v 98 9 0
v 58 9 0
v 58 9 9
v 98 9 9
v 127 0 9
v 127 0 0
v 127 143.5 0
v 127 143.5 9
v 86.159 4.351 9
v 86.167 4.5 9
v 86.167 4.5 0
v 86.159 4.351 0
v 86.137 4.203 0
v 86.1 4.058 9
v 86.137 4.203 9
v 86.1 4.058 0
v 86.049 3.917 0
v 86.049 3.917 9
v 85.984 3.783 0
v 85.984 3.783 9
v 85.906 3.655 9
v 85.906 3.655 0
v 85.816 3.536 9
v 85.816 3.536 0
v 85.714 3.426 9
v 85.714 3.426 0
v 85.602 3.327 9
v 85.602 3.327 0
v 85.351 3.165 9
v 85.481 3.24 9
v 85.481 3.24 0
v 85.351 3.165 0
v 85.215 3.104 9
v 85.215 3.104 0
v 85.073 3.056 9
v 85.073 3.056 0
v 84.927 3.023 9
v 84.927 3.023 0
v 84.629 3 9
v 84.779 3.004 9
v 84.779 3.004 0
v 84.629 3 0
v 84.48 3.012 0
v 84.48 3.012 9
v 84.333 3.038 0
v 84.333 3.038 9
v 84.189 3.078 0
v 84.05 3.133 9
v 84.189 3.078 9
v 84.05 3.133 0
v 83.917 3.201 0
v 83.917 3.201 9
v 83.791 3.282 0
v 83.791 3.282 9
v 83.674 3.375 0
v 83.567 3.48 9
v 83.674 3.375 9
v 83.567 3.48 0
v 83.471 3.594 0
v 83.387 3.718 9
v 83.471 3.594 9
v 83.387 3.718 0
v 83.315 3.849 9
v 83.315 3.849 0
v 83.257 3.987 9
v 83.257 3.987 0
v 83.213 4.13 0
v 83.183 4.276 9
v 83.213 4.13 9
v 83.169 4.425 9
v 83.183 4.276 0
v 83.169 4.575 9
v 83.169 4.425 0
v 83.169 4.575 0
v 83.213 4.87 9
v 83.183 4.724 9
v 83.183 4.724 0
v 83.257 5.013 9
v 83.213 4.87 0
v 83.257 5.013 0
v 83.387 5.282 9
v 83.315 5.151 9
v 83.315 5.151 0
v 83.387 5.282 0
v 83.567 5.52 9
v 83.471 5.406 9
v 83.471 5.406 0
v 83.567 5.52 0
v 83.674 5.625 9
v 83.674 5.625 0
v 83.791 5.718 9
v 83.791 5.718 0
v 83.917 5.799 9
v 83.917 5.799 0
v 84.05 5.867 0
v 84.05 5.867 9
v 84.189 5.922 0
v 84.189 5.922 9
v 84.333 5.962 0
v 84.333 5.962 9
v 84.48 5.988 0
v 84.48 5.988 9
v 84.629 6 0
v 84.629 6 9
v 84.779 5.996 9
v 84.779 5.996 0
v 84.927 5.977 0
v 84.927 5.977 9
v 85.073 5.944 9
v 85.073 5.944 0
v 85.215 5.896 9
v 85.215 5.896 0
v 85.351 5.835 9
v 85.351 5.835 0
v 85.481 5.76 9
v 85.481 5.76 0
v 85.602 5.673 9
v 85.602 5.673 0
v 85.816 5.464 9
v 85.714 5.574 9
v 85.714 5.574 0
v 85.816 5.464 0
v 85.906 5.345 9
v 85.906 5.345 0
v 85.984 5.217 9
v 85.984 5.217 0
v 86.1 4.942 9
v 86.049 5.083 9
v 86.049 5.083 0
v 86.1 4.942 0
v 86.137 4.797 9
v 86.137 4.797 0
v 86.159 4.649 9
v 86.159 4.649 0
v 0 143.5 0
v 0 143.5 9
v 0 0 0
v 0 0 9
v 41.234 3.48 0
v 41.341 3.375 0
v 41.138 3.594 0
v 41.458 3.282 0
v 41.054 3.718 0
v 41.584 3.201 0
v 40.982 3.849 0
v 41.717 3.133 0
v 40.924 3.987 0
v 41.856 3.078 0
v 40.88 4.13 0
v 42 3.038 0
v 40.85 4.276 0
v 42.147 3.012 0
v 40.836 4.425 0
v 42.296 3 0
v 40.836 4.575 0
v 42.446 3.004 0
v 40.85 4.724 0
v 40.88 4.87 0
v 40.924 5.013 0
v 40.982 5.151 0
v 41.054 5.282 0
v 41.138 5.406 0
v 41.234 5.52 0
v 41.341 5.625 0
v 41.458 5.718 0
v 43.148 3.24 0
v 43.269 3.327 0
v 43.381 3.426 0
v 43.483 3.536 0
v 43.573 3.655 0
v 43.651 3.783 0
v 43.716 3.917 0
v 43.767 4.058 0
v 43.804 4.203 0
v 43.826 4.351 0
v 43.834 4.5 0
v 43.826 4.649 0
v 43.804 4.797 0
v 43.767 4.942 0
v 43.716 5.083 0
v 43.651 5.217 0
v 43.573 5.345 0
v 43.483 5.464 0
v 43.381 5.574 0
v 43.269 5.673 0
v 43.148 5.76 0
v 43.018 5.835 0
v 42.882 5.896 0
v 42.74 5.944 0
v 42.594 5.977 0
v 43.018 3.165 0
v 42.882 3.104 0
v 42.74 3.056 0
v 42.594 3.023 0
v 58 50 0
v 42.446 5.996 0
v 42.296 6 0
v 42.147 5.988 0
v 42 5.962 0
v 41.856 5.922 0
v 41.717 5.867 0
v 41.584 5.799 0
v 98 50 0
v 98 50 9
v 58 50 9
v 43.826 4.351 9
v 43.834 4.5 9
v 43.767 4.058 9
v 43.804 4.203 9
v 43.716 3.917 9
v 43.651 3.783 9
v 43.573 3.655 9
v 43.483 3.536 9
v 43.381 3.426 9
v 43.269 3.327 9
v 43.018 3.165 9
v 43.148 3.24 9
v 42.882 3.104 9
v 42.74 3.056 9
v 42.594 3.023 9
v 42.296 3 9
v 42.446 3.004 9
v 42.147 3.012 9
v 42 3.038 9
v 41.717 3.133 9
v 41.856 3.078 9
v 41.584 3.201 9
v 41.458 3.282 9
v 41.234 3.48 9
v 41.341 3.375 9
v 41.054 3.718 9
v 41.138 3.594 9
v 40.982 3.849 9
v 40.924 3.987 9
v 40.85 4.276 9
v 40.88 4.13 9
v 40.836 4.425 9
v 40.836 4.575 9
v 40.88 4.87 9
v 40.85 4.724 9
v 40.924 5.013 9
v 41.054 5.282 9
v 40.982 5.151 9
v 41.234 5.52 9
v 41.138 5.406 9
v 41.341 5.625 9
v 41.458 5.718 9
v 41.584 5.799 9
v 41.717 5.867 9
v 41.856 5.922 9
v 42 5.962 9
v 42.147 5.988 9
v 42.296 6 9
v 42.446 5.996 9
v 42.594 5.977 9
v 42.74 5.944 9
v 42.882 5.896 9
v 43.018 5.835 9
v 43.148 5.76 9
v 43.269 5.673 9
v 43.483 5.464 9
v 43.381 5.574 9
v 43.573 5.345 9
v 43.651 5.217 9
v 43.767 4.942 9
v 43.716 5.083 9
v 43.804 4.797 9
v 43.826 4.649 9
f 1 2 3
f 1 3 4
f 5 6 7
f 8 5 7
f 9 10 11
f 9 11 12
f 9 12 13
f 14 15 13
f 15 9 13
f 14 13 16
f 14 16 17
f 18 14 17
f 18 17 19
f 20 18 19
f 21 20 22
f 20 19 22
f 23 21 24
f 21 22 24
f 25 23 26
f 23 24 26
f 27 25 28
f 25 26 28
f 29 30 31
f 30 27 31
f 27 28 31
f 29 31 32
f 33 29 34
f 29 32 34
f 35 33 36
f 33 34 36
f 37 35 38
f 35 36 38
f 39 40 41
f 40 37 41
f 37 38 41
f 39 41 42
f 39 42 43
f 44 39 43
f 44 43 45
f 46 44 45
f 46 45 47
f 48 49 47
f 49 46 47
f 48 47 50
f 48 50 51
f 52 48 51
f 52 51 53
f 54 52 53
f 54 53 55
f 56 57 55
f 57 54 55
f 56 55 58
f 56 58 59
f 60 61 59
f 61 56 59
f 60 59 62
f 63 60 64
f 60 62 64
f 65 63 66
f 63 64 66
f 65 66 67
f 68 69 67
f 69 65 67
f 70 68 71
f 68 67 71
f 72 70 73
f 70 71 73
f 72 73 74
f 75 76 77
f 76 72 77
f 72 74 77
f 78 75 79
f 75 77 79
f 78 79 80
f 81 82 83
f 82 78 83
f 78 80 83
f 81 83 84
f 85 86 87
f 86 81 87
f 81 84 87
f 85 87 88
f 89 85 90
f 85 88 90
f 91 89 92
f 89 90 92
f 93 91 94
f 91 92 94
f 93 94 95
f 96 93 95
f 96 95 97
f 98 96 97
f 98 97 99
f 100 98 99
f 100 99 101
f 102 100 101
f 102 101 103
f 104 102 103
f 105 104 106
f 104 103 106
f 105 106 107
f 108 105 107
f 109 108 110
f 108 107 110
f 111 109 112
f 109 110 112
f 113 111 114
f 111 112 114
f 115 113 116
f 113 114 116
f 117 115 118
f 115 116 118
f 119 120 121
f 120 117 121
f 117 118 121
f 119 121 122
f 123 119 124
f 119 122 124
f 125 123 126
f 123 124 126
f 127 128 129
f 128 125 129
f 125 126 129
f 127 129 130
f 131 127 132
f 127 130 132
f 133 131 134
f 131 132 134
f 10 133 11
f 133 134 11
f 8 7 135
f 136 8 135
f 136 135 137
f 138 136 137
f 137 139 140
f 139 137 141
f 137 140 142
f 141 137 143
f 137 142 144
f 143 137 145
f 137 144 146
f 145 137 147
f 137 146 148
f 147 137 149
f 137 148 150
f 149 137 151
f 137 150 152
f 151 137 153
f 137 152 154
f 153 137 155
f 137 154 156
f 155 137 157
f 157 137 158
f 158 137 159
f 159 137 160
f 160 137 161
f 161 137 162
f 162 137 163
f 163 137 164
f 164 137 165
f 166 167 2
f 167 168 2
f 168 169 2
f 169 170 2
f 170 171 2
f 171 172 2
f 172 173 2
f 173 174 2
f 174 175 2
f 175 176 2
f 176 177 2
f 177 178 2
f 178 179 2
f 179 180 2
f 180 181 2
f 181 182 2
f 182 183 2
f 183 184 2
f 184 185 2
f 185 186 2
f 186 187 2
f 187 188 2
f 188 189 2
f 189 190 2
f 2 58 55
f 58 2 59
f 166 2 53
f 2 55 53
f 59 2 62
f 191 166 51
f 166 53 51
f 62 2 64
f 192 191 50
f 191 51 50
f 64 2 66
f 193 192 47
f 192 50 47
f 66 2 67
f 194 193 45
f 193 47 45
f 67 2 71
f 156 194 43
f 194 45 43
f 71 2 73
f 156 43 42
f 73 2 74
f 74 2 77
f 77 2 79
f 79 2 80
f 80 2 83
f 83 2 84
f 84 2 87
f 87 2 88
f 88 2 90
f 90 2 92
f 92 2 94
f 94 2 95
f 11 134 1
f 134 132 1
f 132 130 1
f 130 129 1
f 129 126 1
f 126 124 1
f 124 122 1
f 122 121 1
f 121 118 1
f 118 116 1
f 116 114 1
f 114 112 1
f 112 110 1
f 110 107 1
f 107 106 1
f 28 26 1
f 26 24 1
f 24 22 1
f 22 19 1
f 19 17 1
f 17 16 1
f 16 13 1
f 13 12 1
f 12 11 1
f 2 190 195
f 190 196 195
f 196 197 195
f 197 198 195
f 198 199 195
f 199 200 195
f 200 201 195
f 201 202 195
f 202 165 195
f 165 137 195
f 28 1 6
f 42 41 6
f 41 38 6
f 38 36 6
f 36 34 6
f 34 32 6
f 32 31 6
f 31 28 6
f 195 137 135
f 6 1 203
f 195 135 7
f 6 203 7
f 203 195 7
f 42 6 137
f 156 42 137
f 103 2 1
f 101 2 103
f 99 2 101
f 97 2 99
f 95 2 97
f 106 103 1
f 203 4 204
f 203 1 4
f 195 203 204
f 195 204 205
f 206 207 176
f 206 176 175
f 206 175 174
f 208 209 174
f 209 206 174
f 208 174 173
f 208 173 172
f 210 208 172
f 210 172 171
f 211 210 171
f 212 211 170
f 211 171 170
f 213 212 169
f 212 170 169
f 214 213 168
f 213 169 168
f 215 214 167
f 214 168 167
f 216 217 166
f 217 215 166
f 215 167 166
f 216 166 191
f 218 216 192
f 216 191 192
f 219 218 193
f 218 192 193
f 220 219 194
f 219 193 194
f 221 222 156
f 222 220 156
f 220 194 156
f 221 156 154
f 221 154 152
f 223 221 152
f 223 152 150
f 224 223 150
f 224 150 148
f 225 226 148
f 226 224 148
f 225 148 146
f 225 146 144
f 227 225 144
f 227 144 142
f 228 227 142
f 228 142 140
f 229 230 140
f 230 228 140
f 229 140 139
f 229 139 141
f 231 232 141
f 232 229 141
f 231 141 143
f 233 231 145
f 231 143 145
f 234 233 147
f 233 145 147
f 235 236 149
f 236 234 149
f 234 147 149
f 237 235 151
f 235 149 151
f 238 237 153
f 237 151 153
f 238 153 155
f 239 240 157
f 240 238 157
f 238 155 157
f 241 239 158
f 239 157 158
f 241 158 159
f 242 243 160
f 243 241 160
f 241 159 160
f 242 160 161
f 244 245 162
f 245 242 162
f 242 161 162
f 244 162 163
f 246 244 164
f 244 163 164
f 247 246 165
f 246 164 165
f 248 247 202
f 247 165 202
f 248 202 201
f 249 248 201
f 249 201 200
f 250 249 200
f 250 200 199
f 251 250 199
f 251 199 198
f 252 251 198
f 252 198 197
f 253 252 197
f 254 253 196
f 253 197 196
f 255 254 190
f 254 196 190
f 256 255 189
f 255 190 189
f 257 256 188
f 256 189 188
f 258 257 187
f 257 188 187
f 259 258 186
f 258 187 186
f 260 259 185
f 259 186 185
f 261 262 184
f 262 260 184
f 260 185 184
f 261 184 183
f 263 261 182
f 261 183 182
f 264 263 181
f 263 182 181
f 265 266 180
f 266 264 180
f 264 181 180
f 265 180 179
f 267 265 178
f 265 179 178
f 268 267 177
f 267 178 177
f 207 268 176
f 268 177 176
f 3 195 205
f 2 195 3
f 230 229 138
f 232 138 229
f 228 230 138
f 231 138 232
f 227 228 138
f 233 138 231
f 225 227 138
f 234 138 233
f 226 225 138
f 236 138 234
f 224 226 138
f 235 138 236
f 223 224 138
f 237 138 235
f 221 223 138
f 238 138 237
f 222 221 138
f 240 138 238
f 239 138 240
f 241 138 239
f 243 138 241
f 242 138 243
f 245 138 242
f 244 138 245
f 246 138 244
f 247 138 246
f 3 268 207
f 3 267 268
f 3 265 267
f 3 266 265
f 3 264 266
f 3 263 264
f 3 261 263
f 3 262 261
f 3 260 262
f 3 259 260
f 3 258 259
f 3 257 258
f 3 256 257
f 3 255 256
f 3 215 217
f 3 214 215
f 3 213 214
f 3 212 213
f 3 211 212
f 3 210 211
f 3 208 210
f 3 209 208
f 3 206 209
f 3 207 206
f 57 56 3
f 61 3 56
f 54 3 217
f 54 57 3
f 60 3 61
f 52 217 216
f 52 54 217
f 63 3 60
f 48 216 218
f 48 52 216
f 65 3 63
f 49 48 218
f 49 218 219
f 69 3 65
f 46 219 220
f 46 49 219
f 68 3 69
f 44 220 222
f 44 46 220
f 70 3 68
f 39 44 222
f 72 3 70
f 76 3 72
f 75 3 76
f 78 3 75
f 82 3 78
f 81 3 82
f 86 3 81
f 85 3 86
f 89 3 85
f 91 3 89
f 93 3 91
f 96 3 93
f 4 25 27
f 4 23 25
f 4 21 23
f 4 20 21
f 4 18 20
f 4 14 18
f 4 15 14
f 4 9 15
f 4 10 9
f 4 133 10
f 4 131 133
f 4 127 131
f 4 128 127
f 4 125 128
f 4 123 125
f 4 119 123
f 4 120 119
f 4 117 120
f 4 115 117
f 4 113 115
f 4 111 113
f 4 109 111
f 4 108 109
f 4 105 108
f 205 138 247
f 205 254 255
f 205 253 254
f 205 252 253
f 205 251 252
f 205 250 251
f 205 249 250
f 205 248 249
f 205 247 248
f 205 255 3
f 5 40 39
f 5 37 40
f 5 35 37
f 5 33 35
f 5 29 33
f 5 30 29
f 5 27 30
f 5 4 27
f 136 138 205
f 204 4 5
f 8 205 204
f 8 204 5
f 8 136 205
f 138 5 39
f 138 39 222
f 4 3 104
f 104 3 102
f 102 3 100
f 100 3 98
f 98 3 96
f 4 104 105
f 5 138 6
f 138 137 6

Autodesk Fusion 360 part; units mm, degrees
sketch "Skizze1" plane through (0, 0, 0) normal (0, 0, 1) x (1, 0, 0)
  line L0 (0, 0) -> (127, 0)
  line L1 (127, 0) -> (127, 143.5)
  line L2 (127, 143.5) -> (0, 143.5)
  line L3 (0, 143.5) -> (0, 0)
  line L4 (98, 50) -> (58, 50)
  line L5 (58, 50) -> (58, 9)
  line L6 (58, 9) -> (98, 9)
  line L7 (98, 9) -> (98, 50)
  circle A0 centre (84.6667, 4.5) radius 1.5
  circle A1 centre (42.3337, 4.5) radius 1.5
  dimension "d1" = 127
  dimension "d2" = 143.5
  dimension "d3" = 40
  dimension "d4" = 29
  dimension "d5" = 50
  dimension "d6" = 41
  dimension "d7" = 3
  dimension "d8" = 4.5
  dimension "d9" = 42.3333
  dimension "d10" = 3
extrude "Extrusion1" add sketch "Skizze1" along normal blind 9
equation "d5 = 41 mm + 9 mm"
equation "d8 = ( 9 / 2 ) * 1 mm"
equation "d9 = ( 127 / 3 ) * 1 mm"
